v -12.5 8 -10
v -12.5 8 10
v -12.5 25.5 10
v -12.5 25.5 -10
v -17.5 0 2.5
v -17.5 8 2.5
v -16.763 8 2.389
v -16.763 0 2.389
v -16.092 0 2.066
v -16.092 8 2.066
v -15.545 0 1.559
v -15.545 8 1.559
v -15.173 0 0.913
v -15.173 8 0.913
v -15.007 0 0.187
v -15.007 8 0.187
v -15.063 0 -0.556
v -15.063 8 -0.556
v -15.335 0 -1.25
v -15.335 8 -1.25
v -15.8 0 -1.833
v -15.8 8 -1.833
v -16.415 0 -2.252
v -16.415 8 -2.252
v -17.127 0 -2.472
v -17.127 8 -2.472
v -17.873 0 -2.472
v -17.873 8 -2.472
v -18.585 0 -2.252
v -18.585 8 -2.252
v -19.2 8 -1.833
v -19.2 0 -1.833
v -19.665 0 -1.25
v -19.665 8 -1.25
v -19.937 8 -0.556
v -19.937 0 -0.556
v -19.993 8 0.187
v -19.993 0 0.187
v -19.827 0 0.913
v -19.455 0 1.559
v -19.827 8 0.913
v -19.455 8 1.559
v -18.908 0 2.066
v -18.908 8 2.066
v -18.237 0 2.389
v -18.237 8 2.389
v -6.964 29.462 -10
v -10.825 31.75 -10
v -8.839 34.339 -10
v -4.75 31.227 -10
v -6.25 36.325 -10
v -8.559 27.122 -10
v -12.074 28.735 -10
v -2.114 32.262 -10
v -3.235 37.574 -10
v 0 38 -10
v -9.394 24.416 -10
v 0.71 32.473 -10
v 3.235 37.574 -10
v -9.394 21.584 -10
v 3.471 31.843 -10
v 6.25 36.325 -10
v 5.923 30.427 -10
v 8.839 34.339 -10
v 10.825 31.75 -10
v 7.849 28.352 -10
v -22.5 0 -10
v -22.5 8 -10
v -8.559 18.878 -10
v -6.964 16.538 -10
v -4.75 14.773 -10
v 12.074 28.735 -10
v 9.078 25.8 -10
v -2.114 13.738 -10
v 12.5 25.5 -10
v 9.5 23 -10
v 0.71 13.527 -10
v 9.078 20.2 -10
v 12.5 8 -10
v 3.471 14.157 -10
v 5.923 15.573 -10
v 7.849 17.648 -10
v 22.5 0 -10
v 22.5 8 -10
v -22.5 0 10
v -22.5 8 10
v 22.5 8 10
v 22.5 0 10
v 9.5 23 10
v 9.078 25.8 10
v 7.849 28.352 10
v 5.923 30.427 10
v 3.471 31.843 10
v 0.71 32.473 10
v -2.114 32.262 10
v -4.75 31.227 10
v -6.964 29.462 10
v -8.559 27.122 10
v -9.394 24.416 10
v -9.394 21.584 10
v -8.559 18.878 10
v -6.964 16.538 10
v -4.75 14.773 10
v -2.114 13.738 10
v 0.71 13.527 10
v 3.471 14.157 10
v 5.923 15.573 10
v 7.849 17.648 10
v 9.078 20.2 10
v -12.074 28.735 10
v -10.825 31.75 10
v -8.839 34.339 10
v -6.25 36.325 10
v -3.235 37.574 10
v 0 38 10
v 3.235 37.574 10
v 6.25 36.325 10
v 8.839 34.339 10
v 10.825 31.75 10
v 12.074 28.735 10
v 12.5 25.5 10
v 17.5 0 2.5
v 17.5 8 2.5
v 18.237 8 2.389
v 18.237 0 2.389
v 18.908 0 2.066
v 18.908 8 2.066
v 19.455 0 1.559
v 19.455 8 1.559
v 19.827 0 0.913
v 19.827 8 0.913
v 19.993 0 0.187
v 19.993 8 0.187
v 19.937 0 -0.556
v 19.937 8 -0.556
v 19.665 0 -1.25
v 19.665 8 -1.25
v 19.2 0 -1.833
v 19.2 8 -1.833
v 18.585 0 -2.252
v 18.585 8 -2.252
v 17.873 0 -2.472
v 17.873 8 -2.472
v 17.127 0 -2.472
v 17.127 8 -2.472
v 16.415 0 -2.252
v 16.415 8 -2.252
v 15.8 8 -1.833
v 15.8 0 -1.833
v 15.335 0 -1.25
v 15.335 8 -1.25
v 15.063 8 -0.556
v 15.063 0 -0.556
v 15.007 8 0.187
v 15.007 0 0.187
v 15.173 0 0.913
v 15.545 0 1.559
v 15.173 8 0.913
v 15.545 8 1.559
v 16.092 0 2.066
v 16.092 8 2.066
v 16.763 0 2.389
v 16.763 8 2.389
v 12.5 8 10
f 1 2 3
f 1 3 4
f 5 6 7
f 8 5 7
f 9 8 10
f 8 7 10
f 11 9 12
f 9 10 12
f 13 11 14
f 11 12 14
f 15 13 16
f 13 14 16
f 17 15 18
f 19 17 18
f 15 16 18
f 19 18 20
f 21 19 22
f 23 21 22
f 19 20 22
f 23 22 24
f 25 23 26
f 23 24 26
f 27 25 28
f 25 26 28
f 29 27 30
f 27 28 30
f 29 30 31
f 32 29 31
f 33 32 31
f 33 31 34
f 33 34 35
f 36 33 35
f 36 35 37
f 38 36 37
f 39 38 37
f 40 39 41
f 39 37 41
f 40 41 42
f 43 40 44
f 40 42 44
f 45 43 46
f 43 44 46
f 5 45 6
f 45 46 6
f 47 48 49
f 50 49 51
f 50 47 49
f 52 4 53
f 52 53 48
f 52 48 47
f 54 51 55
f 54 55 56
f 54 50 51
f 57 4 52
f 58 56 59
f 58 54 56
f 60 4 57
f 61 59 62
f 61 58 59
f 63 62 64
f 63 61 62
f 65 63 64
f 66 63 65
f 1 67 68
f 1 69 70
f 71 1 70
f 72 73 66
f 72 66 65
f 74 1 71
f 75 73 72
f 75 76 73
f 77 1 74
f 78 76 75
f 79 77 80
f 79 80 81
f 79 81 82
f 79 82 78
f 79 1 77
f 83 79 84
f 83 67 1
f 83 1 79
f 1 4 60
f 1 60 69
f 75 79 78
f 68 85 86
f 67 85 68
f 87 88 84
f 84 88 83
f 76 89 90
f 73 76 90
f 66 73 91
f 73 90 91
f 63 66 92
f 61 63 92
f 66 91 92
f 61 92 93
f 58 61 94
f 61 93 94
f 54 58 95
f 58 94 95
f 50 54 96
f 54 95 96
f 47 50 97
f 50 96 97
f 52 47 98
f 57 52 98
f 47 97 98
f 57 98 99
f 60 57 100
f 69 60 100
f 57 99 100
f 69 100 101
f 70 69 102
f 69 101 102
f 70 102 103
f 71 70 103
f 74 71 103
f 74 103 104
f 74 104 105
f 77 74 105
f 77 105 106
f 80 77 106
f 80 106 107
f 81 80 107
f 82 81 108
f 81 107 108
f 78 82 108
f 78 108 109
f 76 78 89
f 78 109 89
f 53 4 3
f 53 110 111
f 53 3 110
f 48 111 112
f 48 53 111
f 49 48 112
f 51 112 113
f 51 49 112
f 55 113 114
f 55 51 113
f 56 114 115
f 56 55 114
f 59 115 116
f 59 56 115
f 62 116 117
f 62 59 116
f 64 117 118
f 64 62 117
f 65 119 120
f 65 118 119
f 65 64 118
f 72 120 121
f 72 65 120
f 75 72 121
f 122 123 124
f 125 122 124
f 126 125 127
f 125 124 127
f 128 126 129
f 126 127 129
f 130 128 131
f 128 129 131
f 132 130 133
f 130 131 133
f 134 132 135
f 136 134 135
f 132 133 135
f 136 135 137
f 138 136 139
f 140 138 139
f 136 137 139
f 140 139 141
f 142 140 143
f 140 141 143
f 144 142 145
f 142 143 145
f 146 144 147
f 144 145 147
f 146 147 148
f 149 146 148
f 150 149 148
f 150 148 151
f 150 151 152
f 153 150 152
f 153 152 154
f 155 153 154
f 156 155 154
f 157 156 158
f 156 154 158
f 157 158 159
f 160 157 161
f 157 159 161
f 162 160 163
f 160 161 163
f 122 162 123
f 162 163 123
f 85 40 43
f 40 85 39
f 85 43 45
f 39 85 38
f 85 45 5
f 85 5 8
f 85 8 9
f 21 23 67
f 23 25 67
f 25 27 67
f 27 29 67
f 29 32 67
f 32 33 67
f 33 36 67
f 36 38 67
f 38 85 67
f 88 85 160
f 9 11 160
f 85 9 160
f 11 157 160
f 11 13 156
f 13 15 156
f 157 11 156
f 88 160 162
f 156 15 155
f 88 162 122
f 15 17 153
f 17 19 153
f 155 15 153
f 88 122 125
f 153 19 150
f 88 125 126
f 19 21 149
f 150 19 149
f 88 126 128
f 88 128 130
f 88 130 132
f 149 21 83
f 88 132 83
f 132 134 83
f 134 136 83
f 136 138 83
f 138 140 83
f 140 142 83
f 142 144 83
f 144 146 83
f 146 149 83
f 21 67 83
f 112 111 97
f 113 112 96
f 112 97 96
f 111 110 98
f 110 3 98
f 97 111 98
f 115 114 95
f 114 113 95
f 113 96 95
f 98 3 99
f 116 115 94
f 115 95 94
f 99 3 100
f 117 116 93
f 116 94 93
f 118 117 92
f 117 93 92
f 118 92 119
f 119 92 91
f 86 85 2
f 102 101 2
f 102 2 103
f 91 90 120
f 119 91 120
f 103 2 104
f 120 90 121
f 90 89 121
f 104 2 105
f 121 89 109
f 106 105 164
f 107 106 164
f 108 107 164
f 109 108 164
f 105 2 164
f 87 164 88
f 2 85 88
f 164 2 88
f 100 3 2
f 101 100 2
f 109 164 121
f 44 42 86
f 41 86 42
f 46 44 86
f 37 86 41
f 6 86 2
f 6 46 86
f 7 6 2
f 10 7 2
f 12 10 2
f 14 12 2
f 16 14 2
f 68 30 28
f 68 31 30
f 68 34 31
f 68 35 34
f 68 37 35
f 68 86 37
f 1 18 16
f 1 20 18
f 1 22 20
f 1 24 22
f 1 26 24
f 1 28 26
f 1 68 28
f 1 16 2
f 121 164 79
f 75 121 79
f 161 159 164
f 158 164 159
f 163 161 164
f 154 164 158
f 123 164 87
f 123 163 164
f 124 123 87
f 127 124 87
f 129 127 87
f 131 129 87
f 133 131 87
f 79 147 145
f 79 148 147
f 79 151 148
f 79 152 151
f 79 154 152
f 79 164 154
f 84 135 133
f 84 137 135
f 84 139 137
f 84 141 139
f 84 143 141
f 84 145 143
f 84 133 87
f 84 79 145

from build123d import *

# Parameters (mm, degrees)
SKETCH2_W           = 45
SKETCH2_H           = 20
BOSS_EXTRUDE1_DEPTH = 8
SKETCH3_W           = 25
SKETCH3_H           = 20
BOSS_EXTRUDE2_DEPTH = 30
SKETCH4_R           = 2.5
CUT_EXTRUDE1_DEPTH  = 8
SKETCH5_R           = 9.5
CUT_EXTRUDE2_DEPTH  = 20
FILLET2_RADIUS      = 12.5
FILLET2_LENGTH      = 20


with BuildPart() as part:
    # Sketch2 → Boss-Extrude1 (new body)
    with BuildSketch(Plane(origin=(0, 0, 0), x_dir=(1, 0, 0), z_dir=(0, 1, 0))):
        Rectangle(SKETCH2_W, SKETCH2_H)
    extrude(amount=BOSS_EXTRUDE1_DEPTH)

    # Sketch3 → Boss-Extrude2 (add)
    with BuildSketch(Plane(origin=(0, 8, 0), x_dir=(1, 0, 0), z_dir=(0, 1, 0))):
        Rectangle(SKETCH3_W, SKETCH3_H)
    extrude(amount=BOSS_EXTRUDE2_DEPTH)

    # Sketch4 → Cut-Extrude1 (cut)
    with BuildSketch(Plane(origin=(0, 8, 0), x_dir=(1, 0, 0), z_dir=(0, 1, 0))):
        with Locations(Location((-17.5, 0, 0), (0, 0, 270))):
            Circle(SKETCH4_R)
        with Locations(Location((17.5, 0, 0), (0, 0, 270))):
            Circle(SKETCH4_R)
    extrude(amount=-CUT_EXTRUDE1_DEPTH, mode=Mode.SUBTRACT)

    # Sketch5 → Cut-Extrude2 (cut)
    with BuildSketch(Plane.XY.offset(10)):
        with Locations((0, 23)):
            Circle(SKETCH5_R)
    extrude(amount=-CUT_EXTRUDE2_DEPTH, mode=Mode.SUBTRACT)

    # Fillet2: full round fillet: the end face becomes a half cylinder, R = half its width
    fillet2_face = Plane((0, 38, 0), x_dir=(0, 0, -1), z_dir=(0, 1, 0))  # on the end face: x along it, z out of the body
    fillet2_slab = fillet2_face.offset(-FILLET2_RADIUS / 2) * Box(FILLET2_LENGTH, 2 * FILLET2_RADIUS, FILLET2_RADIUS, mode=Mode.PRIVATE)  # the body's end, R deep
    fillet2_round = Plane((0, 25.5, 0), x_dir=(0, 1, 0), z_dir=(0, 0, -1)) * Cylinder(FILLET2_RADIUS, FILLET2_LENGTH, mode=Mode.PRIVATE)  # its axis R under the face
    add(fillet2_slab - fillet2_round, mode=Mode.SUBTRACT)


solid = part.part
